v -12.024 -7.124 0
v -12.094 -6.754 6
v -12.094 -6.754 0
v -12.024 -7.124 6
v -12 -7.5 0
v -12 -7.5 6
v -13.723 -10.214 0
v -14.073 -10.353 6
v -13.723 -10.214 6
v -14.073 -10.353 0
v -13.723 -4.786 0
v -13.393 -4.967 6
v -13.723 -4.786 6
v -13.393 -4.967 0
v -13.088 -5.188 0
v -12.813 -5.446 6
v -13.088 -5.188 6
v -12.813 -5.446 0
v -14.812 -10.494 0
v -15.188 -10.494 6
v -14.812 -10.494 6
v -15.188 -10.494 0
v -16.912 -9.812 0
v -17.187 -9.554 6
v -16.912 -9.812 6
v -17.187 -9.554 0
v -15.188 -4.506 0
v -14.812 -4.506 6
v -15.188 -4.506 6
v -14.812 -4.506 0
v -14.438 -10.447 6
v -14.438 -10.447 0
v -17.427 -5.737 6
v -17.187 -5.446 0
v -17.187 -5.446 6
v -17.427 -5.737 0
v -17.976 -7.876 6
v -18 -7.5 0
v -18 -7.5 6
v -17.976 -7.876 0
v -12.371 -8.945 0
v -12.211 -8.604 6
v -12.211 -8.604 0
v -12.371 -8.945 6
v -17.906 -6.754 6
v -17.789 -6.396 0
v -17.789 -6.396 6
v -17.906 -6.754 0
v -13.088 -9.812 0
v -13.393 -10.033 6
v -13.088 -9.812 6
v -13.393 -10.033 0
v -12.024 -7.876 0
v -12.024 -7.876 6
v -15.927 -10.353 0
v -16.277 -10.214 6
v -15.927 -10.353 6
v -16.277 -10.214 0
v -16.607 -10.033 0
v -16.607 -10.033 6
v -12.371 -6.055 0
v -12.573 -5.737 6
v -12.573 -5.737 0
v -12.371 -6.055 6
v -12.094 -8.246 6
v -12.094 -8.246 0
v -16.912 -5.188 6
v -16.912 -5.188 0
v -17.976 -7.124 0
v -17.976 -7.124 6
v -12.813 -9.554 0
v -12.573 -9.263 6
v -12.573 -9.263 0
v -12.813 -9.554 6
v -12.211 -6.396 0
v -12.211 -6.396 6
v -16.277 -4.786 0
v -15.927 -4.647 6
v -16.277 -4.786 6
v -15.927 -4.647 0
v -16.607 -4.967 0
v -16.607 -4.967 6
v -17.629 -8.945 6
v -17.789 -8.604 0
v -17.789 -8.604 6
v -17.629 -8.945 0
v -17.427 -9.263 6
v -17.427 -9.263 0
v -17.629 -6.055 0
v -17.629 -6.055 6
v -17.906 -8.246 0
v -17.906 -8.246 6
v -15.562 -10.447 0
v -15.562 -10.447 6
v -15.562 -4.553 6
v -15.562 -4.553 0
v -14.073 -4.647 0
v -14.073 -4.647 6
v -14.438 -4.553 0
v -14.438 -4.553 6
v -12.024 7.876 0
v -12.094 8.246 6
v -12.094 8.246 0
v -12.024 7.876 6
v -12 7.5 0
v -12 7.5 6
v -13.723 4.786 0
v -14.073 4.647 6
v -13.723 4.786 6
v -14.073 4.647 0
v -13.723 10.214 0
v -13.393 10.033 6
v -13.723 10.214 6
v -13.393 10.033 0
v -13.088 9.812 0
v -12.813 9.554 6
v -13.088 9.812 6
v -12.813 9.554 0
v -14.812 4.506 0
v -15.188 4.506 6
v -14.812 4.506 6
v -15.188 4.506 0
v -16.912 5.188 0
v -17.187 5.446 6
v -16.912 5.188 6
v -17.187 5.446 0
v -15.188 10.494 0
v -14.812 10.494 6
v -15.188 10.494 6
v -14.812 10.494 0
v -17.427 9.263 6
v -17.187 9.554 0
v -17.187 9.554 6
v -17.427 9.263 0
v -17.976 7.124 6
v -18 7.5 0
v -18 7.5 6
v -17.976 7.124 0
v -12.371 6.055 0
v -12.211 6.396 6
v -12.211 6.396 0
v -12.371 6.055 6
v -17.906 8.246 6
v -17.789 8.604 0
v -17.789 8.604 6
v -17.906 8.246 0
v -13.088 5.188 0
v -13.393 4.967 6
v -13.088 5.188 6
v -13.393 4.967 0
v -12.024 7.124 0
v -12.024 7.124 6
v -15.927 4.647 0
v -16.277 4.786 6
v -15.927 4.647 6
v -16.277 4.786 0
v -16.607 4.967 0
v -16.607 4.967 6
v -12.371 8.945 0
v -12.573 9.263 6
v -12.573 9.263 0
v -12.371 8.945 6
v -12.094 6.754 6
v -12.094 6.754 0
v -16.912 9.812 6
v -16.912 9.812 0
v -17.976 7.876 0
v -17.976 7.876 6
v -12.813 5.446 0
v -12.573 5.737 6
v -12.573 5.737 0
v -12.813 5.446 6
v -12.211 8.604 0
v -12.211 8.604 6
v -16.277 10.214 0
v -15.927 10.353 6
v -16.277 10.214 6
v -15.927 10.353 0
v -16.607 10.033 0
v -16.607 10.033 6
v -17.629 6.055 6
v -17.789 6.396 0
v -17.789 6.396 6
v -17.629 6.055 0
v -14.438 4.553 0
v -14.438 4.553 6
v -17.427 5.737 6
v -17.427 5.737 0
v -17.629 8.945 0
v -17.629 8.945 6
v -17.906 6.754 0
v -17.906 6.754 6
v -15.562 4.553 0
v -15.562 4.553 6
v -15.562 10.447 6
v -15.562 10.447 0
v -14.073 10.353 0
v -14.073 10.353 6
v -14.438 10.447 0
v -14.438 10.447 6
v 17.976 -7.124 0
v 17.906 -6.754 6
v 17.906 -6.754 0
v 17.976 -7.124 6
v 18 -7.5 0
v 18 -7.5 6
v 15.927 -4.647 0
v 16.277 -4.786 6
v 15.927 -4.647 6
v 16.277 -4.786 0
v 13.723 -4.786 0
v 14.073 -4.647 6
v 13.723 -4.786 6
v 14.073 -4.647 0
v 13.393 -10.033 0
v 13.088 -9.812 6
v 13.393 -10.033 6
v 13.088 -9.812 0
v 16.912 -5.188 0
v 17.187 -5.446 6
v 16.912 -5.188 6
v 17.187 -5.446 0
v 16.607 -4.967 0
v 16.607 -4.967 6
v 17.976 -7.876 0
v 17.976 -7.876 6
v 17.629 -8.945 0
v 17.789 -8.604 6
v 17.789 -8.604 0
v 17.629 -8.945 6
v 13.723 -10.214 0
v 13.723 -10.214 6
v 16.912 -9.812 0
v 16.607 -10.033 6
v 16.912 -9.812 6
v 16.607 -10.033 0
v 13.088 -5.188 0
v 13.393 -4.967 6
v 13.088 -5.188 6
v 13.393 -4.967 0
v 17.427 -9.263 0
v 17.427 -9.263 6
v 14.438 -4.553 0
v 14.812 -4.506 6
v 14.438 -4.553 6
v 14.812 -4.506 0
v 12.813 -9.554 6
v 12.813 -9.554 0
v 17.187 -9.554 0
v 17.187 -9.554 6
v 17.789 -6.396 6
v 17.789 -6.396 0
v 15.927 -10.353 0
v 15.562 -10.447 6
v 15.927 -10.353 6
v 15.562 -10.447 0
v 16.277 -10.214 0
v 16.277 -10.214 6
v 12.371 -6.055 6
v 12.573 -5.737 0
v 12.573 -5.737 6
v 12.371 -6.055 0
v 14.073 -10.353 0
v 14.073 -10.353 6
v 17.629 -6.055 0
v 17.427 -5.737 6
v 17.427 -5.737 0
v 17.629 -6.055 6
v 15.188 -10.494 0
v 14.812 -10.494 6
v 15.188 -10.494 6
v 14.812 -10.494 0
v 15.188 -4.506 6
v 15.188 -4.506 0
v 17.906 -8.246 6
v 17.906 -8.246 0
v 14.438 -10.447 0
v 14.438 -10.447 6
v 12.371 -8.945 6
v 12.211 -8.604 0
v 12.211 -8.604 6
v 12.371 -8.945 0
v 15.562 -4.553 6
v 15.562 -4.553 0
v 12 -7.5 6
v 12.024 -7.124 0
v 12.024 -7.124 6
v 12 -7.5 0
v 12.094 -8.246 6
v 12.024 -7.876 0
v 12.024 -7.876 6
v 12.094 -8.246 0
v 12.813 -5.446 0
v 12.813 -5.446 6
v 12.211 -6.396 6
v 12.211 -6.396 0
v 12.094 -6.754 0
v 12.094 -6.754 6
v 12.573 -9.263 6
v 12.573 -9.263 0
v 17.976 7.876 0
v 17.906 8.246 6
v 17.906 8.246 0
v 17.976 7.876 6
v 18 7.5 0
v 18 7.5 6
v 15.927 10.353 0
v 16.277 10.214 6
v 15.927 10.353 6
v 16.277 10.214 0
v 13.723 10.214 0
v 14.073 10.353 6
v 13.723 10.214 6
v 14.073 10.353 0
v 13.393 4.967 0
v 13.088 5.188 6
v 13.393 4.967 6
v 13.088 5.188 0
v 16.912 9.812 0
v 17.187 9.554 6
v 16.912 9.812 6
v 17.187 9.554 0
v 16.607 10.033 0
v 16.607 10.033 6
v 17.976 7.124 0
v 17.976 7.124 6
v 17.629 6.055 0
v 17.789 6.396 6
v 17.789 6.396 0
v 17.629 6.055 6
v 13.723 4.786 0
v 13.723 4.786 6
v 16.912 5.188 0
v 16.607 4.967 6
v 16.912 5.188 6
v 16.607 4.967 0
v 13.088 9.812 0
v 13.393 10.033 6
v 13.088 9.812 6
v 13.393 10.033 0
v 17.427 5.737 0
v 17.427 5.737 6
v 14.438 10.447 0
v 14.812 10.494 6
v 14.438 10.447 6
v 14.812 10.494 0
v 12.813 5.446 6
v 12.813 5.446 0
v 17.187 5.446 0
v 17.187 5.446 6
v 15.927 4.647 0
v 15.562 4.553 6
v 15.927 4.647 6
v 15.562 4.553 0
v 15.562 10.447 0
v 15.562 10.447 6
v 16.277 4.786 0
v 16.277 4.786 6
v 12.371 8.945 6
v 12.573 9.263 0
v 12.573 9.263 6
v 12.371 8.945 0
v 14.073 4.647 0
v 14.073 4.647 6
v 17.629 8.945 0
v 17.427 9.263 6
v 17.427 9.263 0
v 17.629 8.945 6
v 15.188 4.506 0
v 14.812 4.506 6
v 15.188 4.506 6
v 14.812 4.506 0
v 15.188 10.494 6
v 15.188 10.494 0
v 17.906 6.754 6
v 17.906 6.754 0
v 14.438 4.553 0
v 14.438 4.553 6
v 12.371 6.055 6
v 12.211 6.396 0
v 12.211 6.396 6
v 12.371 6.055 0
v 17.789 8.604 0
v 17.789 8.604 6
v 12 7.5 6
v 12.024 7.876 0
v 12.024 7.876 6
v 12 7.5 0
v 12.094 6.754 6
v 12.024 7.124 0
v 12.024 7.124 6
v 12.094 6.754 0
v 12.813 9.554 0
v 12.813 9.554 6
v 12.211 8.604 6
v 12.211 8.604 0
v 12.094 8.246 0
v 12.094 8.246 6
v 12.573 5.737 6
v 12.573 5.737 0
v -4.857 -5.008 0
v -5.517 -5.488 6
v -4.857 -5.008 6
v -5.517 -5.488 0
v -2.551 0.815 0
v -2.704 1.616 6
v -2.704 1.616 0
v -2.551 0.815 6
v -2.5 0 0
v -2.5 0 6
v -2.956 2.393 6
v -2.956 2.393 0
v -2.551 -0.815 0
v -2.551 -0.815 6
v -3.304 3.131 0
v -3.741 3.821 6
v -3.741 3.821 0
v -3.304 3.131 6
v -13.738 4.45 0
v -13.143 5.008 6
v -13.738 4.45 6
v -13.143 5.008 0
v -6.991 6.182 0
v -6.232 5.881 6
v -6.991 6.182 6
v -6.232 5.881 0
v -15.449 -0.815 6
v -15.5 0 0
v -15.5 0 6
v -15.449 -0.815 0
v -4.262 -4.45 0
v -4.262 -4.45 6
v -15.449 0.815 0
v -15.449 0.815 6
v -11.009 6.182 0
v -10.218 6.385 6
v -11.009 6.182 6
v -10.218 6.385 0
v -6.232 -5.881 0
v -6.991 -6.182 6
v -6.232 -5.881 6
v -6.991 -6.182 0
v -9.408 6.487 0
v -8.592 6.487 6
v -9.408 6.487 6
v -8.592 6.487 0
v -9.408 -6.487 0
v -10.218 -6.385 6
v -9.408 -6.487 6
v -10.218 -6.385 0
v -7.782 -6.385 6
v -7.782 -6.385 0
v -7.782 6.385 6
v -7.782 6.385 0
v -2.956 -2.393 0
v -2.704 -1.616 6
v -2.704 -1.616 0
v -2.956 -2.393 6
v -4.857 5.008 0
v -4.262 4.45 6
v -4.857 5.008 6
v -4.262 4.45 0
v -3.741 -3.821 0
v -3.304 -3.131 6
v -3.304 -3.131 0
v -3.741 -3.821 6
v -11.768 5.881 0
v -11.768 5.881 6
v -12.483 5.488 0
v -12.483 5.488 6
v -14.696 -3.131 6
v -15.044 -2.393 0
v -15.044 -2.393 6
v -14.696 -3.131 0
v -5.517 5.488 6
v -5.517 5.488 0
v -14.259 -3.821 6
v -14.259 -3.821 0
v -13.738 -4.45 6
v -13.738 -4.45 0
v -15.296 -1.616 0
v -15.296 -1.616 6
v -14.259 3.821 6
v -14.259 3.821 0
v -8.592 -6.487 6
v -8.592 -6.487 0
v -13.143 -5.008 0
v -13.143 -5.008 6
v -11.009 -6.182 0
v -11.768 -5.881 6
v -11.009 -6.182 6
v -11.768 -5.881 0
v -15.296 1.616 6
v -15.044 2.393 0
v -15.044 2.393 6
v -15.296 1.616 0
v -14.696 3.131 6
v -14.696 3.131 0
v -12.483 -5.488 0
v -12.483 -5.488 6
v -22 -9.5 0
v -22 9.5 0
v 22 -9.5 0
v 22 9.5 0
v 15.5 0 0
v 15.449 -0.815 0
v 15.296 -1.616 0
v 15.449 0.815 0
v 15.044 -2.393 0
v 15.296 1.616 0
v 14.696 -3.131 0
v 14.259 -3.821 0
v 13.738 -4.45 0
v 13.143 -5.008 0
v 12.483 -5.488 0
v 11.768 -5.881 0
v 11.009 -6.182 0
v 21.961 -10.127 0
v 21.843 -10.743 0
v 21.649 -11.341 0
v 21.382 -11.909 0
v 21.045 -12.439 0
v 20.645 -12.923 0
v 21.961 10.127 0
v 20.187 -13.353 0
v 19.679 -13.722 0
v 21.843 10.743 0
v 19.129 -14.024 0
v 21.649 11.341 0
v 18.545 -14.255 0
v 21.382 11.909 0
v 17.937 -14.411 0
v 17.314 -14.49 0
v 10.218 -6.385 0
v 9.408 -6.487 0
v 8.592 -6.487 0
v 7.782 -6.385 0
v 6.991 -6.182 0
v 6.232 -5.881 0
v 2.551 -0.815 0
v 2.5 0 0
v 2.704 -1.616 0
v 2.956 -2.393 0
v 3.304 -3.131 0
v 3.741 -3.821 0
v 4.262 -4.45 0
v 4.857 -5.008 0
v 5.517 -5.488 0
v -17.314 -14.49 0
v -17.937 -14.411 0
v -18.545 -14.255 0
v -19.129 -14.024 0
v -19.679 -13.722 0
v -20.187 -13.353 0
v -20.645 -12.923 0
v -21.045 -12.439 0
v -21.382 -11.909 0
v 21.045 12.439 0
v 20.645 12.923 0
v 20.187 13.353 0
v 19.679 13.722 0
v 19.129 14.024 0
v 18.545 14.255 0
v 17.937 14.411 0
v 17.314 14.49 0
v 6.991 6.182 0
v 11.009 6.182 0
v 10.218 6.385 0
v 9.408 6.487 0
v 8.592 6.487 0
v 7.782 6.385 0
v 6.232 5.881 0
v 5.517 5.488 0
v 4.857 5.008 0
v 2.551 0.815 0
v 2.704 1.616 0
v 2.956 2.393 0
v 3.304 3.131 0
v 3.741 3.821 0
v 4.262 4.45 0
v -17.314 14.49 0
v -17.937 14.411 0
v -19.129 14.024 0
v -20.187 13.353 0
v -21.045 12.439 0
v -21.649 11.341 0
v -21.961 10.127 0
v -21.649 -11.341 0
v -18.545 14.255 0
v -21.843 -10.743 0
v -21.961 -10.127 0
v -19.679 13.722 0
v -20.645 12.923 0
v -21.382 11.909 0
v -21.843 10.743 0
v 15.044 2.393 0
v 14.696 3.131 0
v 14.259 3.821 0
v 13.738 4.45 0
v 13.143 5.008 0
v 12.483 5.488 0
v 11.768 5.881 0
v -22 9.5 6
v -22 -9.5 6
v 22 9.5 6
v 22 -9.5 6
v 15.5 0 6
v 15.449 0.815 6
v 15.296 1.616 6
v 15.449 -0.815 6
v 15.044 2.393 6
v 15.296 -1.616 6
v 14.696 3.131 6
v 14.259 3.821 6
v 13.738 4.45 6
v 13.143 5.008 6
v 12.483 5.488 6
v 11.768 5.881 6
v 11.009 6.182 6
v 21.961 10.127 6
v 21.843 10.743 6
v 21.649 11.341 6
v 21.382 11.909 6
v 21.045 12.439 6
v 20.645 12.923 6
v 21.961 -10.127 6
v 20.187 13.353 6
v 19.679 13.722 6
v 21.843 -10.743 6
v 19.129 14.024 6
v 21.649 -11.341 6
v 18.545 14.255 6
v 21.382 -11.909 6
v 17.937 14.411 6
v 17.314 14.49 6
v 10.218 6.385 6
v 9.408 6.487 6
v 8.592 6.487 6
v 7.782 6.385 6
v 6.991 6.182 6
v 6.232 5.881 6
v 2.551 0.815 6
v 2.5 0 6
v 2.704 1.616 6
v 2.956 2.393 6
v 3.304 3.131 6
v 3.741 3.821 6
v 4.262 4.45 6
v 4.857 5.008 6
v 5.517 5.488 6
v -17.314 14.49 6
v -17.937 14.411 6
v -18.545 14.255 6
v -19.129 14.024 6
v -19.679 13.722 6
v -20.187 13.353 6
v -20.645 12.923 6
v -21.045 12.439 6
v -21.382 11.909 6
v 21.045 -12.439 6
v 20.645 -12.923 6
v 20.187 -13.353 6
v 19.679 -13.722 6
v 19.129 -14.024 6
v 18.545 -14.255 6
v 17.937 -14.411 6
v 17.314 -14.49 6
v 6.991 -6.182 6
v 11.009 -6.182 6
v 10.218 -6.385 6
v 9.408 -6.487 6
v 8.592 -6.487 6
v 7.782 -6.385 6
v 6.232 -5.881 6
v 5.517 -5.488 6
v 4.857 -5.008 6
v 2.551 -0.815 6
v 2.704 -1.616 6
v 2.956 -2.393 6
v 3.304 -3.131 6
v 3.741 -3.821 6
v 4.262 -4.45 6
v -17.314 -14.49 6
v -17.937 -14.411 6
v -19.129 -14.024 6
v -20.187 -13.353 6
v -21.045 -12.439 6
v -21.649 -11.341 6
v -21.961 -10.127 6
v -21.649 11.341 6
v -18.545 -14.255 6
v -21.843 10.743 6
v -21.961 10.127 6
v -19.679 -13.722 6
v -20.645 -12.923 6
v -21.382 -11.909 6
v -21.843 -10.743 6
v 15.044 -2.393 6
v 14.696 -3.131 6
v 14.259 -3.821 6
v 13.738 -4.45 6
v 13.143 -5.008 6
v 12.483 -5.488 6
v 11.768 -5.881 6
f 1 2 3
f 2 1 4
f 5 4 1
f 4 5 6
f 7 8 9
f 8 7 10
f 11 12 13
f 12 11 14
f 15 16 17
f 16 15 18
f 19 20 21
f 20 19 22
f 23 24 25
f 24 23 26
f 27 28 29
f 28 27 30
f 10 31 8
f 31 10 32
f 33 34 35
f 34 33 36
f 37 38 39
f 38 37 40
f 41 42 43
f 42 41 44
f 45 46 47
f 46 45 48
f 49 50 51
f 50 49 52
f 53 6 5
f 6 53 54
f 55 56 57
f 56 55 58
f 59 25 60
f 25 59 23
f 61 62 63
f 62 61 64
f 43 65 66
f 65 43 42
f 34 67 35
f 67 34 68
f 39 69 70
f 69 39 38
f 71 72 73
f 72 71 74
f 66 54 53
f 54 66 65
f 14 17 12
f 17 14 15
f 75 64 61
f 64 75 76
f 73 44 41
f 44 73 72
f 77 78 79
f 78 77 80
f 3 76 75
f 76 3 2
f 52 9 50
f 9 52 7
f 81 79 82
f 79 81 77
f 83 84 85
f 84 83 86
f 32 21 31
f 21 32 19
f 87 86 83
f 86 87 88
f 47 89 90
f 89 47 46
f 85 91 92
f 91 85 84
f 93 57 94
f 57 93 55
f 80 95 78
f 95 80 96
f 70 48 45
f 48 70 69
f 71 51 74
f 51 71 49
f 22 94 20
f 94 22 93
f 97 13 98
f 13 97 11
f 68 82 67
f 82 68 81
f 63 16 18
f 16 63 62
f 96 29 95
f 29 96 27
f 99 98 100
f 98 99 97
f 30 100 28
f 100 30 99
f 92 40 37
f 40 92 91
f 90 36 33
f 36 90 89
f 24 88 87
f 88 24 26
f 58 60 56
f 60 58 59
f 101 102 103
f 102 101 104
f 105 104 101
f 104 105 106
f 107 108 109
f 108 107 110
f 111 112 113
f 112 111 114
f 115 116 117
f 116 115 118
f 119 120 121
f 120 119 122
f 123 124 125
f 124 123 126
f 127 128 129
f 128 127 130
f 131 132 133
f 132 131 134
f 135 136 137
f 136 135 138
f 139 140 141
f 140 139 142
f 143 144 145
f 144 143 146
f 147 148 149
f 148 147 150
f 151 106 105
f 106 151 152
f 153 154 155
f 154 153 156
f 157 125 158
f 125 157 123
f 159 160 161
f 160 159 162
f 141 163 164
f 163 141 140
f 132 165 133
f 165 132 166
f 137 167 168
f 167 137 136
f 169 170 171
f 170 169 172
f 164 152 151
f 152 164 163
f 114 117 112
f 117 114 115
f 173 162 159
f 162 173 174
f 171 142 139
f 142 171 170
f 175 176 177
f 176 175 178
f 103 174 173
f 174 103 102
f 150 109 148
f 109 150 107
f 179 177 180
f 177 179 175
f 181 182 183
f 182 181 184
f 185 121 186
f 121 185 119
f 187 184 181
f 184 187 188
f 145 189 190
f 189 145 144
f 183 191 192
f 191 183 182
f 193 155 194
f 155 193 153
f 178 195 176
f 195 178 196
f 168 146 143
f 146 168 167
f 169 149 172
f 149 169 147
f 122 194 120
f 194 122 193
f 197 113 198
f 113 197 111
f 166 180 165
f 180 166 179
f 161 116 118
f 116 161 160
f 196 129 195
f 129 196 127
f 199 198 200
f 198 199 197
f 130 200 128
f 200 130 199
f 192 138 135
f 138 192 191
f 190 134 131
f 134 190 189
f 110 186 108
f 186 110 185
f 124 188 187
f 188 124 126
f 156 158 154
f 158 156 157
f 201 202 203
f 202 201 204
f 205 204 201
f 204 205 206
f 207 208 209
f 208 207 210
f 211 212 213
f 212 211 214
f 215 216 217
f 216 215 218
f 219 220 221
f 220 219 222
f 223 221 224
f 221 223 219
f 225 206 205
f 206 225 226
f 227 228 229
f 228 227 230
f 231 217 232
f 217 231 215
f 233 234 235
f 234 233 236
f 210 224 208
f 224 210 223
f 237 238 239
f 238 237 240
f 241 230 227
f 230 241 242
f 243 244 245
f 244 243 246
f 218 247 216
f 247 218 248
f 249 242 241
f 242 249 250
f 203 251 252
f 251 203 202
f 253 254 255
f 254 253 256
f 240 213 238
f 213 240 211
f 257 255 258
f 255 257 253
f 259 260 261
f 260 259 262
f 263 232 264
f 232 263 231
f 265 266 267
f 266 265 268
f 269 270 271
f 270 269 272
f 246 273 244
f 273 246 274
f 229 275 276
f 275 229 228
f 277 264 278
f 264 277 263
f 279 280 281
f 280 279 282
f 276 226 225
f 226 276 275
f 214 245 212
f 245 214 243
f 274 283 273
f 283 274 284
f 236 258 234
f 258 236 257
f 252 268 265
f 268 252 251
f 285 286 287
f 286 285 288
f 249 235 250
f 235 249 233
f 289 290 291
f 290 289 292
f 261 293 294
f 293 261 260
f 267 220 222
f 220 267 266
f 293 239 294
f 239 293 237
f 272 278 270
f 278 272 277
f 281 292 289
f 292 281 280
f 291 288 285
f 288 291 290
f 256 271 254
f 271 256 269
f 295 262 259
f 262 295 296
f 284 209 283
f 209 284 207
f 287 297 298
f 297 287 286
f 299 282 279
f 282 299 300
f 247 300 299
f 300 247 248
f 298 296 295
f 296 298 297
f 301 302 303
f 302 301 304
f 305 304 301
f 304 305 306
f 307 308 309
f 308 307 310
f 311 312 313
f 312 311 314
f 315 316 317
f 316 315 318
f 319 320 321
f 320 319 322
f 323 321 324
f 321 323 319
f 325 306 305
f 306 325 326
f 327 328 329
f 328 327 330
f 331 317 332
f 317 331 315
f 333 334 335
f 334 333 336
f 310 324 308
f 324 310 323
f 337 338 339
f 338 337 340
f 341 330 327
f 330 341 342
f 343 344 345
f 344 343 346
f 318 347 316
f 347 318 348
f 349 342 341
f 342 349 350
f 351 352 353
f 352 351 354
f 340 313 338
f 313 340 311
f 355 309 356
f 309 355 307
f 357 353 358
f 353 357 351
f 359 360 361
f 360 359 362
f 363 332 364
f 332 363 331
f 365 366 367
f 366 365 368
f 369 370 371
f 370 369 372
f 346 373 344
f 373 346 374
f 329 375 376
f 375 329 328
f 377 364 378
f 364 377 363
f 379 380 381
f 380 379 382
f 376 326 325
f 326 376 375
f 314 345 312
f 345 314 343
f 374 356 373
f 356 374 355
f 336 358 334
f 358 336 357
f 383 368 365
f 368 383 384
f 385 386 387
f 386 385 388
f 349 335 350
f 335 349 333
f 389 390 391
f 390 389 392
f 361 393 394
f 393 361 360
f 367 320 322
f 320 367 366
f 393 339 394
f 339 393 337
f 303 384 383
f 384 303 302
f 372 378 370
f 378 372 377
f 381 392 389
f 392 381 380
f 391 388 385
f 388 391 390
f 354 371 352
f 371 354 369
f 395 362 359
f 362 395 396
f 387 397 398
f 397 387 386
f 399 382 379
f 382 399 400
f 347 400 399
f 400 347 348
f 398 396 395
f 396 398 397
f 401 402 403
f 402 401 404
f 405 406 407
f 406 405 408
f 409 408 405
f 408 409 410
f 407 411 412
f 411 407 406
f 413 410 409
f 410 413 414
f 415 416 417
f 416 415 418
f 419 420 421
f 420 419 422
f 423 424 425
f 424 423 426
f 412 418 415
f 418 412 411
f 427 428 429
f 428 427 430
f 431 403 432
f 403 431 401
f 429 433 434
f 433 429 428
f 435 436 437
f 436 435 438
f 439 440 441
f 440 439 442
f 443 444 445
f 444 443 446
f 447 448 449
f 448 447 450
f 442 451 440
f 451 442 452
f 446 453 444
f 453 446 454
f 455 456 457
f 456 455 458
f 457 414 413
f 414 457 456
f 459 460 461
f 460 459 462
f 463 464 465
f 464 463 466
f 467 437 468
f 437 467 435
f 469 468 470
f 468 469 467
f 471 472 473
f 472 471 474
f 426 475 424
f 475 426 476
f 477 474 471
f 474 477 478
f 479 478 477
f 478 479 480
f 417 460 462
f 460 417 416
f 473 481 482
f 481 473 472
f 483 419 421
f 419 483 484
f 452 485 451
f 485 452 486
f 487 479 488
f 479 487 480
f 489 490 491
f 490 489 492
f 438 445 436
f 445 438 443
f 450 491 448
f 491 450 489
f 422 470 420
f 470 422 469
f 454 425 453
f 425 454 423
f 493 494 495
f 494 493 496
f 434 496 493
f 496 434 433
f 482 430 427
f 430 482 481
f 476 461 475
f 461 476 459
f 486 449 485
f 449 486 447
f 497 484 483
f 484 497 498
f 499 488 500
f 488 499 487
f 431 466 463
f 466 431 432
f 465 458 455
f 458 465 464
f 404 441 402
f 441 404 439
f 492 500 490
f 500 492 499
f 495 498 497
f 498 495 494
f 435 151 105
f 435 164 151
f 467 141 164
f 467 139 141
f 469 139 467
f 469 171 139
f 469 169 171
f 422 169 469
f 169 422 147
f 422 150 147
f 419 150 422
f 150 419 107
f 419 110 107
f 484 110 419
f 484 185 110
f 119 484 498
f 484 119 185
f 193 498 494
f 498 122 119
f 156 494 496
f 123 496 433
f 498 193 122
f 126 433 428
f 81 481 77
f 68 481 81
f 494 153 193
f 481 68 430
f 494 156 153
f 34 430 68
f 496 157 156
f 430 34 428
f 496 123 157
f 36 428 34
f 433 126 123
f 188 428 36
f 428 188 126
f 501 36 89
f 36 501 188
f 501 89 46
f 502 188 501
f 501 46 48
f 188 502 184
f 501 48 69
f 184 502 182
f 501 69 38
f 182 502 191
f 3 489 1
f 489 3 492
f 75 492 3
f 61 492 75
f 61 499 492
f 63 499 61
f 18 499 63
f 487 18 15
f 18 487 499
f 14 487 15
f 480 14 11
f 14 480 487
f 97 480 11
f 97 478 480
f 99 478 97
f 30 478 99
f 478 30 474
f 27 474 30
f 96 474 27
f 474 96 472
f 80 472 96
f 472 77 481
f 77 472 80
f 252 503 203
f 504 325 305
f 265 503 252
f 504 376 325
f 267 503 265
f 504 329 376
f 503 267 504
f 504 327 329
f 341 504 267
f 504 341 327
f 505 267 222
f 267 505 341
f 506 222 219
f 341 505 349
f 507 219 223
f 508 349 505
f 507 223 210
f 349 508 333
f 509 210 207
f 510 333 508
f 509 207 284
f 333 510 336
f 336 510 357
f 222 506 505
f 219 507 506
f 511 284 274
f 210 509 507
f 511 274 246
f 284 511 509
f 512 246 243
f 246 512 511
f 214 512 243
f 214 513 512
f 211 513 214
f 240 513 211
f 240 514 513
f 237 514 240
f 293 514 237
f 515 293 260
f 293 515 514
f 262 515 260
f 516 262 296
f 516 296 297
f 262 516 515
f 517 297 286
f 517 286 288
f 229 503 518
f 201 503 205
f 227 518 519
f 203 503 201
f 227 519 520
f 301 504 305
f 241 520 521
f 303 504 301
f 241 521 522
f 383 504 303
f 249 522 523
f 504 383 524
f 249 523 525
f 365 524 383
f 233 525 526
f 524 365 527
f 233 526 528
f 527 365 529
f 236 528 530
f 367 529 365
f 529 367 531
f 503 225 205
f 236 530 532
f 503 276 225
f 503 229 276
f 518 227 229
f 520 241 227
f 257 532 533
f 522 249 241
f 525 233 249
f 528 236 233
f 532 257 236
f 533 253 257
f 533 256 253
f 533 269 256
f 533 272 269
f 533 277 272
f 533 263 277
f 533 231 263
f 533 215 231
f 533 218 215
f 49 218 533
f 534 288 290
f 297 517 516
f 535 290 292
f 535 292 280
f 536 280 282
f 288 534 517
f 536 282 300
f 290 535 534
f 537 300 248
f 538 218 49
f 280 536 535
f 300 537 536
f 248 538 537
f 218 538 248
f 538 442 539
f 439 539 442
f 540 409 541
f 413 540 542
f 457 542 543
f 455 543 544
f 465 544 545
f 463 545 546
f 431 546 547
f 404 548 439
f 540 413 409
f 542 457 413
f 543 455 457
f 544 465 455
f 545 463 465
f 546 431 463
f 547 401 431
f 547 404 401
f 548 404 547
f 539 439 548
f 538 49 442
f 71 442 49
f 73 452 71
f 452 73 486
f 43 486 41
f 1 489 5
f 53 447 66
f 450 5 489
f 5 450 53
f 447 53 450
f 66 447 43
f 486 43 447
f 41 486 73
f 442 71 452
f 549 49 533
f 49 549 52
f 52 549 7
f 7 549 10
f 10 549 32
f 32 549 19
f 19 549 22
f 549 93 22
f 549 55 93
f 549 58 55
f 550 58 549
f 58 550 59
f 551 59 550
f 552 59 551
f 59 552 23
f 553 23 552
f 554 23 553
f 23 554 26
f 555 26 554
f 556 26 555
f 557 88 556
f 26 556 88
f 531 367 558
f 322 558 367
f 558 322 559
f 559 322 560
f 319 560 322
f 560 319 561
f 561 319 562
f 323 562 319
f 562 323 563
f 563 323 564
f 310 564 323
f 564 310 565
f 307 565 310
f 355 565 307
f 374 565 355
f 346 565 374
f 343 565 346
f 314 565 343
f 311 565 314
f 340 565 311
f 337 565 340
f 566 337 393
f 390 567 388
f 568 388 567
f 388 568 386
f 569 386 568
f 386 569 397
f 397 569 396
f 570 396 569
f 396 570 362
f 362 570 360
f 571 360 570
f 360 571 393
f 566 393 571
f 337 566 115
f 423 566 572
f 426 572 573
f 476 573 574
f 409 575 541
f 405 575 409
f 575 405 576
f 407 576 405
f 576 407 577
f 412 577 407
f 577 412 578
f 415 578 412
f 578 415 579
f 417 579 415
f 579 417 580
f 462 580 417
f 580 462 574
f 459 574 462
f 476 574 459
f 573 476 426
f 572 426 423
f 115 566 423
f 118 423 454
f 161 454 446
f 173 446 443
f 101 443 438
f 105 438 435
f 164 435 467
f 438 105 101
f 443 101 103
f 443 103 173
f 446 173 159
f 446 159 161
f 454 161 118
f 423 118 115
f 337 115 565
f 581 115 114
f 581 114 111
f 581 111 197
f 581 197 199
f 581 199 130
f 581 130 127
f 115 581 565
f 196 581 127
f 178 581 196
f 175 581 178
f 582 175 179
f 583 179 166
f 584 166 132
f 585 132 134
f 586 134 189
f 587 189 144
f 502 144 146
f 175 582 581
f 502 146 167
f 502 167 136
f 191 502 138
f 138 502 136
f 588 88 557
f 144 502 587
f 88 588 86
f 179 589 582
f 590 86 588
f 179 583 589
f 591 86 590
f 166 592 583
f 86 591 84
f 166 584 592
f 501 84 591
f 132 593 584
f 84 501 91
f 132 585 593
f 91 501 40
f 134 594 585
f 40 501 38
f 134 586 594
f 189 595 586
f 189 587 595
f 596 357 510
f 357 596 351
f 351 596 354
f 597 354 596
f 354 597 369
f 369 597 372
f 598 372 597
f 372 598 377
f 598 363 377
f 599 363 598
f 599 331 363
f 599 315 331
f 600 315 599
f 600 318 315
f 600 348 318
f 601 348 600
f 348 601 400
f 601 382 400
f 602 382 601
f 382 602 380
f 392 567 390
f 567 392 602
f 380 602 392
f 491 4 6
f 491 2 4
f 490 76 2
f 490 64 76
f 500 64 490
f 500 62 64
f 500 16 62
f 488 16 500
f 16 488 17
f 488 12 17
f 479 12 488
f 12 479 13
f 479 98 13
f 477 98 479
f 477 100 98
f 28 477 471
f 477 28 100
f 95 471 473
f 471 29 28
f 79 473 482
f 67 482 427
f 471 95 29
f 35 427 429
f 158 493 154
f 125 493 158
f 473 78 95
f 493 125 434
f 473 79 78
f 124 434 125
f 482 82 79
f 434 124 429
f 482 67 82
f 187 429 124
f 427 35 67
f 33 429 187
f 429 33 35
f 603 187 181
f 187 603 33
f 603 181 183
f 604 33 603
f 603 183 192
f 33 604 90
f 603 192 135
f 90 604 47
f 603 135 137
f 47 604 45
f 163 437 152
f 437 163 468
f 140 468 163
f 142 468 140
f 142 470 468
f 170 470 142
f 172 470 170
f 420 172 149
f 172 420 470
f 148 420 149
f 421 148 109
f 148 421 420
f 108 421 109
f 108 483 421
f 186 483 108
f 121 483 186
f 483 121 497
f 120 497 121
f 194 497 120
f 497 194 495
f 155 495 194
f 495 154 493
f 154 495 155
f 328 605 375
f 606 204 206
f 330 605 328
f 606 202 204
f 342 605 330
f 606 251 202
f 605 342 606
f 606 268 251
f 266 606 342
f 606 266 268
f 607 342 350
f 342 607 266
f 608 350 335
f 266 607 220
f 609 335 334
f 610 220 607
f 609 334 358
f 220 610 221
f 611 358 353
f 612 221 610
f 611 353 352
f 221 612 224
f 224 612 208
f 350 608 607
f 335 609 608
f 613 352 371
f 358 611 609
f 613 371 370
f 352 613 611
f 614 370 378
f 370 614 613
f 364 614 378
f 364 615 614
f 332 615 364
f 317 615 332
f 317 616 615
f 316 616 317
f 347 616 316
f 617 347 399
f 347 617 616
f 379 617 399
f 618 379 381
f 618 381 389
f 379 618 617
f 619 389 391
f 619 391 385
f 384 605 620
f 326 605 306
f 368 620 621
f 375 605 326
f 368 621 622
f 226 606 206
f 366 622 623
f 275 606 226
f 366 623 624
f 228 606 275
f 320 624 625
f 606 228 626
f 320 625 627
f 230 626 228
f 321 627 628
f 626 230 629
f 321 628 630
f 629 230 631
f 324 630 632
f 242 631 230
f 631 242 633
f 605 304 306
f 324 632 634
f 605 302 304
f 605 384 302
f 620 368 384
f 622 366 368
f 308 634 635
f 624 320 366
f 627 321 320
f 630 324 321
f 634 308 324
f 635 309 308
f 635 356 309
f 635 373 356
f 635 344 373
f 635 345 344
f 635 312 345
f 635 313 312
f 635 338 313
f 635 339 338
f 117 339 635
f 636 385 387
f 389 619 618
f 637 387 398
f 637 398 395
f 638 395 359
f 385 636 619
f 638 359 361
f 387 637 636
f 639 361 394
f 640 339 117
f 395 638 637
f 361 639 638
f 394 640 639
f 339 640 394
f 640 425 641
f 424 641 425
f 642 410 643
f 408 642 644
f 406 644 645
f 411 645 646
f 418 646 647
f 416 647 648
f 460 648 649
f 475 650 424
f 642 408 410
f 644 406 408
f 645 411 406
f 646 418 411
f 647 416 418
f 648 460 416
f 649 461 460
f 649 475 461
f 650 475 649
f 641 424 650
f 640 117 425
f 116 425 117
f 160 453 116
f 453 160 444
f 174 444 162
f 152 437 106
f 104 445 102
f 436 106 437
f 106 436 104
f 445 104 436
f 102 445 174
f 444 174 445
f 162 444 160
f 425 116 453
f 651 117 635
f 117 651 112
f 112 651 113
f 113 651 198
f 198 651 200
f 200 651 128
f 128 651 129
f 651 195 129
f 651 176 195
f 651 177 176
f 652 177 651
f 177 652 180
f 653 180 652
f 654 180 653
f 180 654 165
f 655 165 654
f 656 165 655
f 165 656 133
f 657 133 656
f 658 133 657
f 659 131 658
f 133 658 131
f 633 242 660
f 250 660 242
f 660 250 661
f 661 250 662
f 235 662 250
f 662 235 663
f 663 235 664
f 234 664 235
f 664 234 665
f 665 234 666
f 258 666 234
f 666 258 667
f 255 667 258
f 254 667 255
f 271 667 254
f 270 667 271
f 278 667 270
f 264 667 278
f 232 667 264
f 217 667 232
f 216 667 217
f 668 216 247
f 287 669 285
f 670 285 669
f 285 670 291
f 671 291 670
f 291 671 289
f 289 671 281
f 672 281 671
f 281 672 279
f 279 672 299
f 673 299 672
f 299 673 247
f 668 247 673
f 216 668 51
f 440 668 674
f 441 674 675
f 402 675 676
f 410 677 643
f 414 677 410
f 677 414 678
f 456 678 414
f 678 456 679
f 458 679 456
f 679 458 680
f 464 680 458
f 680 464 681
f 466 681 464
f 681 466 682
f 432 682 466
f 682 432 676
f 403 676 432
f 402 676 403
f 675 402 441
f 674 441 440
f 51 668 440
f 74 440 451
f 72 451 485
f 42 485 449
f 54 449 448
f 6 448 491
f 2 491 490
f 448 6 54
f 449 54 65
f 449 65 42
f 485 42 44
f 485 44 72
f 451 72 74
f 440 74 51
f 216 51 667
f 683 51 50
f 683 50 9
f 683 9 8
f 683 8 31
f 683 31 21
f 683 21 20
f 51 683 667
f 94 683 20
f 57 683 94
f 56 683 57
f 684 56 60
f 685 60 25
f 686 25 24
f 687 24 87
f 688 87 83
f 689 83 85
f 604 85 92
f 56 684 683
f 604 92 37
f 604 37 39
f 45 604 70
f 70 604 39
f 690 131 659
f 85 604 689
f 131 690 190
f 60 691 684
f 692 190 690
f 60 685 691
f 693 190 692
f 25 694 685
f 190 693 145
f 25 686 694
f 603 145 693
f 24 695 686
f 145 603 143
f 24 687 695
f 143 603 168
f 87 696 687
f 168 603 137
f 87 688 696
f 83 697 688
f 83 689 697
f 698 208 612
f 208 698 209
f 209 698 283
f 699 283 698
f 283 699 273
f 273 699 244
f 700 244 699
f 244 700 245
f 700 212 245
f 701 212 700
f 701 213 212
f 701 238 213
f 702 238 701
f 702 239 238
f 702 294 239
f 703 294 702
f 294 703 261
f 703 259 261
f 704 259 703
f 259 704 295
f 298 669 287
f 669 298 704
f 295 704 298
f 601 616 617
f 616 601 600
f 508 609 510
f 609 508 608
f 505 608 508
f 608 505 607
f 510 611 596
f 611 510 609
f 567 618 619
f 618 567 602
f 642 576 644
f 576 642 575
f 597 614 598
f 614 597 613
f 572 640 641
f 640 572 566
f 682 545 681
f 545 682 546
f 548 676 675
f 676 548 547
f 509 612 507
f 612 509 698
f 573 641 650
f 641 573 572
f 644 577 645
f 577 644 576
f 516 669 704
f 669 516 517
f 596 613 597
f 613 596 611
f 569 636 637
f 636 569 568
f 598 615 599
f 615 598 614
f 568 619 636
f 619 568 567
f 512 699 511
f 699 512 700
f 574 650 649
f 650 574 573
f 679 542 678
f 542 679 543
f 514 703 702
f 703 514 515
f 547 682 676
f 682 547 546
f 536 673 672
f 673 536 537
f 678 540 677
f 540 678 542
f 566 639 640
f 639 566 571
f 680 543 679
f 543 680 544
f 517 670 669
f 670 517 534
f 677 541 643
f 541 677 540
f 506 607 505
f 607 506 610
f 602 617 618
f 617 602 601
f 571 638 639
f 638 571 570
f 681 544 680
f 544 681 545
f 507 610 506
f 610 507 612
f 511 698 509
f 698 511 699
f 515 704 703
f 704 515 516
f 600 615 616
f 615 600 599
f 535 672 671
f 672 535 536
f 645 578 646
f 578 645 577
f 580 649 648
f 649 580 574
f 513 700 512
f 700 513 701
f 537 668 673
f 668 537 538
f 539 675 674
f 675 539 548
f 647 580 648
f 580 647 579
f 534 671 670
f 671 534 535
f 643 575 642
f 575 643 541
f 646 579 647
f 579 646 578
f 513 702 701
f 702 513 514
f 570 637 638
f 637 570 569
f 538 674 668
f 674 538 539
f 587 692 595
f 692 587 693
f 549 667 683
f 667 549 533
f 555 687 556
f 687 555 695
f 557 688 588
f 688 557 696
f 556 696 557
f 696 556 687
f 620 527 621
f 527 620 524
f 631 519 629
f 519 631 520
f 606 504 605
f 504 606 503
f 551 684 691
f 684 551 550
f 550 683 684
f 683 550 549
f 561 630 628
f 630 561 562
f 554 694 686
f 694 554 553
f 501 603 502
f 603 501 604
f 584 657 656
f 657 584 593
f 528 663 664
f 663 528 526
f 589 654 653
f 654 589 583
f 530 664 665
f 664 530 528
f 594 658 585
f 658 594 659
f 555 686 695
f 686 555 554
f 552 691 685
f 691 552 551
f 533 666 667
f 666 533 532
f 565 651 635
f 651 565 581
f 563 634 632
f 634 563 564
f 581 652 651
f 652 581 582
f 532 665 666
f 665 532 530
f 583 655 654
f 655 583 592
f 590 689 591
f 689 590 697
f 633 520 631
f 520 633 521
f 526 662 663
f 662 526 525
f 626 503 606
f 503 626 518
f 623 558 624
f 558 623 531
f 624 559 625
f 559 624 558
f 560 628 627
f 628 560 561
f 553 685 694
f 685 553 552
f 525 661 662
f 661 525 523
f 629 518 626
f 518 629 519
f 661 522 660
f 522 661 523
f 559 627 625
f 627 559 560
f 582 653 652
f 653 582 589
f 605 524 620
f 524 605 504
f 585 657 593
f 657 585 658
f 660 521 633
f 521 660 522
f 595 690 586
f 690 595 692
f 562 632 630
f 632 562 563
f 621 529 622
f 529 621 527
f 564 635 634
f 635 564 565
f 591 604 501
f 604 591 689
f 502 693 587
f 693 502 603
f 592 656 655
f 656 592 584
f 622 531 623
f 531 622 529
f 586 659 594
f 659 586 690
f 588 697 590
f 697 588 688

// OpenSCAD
$fn = 50;


difference() {
	union() {
		hull() {
			translate(v = [-17.0000000000, 9.5000000000, 0]) {
				cylinder(h = 6, r = 5);
			}
			translate(v = [17.0000000000, 9.5000000000, 0]) {
				cylinder(h = 6, r = 5);
			}
			translate(v = [-17.0000000000, -9.5000000000, 0]) {
				cylinder(h = 6, r = 5);
			}
			translate(v = [17.0000000000, -9.5000000000, 0]) {
				cylinder(h = 6, r = 5);
			}
		}
	}
	union() {
		#translate(v = [-15.0000000000, -7.5000000000, -100.0000000000]) {
			cylinder(h = 200, r = 3.0000000000);
		}
		#translate(v = [-15.0000000000, 7.5000000000, -100.0000000000]) {
			cylinder(h = 200, r = 3.0000000000);
		}
		#translate(v = [15.0000000000, -7.5000000000, -100.0000000000]) {
			cylinder(h = 200, r = 3.0000000000);
		}
		#translate(v = [15.0000000000, 7.5000000000, -100.0000000000]) {
			cylinder(h = 200, r = 3.0000000000);
		}
		#translate(v = [-9.0000000000, 0, 0]) {
			cylinder(h = 6, r = 6.5000000000);
		}
		#translate(v = [9.0000000000, 0, 0]) {
			cylinder(h = 6, r = 6.5000000000);
		}
	}
}
